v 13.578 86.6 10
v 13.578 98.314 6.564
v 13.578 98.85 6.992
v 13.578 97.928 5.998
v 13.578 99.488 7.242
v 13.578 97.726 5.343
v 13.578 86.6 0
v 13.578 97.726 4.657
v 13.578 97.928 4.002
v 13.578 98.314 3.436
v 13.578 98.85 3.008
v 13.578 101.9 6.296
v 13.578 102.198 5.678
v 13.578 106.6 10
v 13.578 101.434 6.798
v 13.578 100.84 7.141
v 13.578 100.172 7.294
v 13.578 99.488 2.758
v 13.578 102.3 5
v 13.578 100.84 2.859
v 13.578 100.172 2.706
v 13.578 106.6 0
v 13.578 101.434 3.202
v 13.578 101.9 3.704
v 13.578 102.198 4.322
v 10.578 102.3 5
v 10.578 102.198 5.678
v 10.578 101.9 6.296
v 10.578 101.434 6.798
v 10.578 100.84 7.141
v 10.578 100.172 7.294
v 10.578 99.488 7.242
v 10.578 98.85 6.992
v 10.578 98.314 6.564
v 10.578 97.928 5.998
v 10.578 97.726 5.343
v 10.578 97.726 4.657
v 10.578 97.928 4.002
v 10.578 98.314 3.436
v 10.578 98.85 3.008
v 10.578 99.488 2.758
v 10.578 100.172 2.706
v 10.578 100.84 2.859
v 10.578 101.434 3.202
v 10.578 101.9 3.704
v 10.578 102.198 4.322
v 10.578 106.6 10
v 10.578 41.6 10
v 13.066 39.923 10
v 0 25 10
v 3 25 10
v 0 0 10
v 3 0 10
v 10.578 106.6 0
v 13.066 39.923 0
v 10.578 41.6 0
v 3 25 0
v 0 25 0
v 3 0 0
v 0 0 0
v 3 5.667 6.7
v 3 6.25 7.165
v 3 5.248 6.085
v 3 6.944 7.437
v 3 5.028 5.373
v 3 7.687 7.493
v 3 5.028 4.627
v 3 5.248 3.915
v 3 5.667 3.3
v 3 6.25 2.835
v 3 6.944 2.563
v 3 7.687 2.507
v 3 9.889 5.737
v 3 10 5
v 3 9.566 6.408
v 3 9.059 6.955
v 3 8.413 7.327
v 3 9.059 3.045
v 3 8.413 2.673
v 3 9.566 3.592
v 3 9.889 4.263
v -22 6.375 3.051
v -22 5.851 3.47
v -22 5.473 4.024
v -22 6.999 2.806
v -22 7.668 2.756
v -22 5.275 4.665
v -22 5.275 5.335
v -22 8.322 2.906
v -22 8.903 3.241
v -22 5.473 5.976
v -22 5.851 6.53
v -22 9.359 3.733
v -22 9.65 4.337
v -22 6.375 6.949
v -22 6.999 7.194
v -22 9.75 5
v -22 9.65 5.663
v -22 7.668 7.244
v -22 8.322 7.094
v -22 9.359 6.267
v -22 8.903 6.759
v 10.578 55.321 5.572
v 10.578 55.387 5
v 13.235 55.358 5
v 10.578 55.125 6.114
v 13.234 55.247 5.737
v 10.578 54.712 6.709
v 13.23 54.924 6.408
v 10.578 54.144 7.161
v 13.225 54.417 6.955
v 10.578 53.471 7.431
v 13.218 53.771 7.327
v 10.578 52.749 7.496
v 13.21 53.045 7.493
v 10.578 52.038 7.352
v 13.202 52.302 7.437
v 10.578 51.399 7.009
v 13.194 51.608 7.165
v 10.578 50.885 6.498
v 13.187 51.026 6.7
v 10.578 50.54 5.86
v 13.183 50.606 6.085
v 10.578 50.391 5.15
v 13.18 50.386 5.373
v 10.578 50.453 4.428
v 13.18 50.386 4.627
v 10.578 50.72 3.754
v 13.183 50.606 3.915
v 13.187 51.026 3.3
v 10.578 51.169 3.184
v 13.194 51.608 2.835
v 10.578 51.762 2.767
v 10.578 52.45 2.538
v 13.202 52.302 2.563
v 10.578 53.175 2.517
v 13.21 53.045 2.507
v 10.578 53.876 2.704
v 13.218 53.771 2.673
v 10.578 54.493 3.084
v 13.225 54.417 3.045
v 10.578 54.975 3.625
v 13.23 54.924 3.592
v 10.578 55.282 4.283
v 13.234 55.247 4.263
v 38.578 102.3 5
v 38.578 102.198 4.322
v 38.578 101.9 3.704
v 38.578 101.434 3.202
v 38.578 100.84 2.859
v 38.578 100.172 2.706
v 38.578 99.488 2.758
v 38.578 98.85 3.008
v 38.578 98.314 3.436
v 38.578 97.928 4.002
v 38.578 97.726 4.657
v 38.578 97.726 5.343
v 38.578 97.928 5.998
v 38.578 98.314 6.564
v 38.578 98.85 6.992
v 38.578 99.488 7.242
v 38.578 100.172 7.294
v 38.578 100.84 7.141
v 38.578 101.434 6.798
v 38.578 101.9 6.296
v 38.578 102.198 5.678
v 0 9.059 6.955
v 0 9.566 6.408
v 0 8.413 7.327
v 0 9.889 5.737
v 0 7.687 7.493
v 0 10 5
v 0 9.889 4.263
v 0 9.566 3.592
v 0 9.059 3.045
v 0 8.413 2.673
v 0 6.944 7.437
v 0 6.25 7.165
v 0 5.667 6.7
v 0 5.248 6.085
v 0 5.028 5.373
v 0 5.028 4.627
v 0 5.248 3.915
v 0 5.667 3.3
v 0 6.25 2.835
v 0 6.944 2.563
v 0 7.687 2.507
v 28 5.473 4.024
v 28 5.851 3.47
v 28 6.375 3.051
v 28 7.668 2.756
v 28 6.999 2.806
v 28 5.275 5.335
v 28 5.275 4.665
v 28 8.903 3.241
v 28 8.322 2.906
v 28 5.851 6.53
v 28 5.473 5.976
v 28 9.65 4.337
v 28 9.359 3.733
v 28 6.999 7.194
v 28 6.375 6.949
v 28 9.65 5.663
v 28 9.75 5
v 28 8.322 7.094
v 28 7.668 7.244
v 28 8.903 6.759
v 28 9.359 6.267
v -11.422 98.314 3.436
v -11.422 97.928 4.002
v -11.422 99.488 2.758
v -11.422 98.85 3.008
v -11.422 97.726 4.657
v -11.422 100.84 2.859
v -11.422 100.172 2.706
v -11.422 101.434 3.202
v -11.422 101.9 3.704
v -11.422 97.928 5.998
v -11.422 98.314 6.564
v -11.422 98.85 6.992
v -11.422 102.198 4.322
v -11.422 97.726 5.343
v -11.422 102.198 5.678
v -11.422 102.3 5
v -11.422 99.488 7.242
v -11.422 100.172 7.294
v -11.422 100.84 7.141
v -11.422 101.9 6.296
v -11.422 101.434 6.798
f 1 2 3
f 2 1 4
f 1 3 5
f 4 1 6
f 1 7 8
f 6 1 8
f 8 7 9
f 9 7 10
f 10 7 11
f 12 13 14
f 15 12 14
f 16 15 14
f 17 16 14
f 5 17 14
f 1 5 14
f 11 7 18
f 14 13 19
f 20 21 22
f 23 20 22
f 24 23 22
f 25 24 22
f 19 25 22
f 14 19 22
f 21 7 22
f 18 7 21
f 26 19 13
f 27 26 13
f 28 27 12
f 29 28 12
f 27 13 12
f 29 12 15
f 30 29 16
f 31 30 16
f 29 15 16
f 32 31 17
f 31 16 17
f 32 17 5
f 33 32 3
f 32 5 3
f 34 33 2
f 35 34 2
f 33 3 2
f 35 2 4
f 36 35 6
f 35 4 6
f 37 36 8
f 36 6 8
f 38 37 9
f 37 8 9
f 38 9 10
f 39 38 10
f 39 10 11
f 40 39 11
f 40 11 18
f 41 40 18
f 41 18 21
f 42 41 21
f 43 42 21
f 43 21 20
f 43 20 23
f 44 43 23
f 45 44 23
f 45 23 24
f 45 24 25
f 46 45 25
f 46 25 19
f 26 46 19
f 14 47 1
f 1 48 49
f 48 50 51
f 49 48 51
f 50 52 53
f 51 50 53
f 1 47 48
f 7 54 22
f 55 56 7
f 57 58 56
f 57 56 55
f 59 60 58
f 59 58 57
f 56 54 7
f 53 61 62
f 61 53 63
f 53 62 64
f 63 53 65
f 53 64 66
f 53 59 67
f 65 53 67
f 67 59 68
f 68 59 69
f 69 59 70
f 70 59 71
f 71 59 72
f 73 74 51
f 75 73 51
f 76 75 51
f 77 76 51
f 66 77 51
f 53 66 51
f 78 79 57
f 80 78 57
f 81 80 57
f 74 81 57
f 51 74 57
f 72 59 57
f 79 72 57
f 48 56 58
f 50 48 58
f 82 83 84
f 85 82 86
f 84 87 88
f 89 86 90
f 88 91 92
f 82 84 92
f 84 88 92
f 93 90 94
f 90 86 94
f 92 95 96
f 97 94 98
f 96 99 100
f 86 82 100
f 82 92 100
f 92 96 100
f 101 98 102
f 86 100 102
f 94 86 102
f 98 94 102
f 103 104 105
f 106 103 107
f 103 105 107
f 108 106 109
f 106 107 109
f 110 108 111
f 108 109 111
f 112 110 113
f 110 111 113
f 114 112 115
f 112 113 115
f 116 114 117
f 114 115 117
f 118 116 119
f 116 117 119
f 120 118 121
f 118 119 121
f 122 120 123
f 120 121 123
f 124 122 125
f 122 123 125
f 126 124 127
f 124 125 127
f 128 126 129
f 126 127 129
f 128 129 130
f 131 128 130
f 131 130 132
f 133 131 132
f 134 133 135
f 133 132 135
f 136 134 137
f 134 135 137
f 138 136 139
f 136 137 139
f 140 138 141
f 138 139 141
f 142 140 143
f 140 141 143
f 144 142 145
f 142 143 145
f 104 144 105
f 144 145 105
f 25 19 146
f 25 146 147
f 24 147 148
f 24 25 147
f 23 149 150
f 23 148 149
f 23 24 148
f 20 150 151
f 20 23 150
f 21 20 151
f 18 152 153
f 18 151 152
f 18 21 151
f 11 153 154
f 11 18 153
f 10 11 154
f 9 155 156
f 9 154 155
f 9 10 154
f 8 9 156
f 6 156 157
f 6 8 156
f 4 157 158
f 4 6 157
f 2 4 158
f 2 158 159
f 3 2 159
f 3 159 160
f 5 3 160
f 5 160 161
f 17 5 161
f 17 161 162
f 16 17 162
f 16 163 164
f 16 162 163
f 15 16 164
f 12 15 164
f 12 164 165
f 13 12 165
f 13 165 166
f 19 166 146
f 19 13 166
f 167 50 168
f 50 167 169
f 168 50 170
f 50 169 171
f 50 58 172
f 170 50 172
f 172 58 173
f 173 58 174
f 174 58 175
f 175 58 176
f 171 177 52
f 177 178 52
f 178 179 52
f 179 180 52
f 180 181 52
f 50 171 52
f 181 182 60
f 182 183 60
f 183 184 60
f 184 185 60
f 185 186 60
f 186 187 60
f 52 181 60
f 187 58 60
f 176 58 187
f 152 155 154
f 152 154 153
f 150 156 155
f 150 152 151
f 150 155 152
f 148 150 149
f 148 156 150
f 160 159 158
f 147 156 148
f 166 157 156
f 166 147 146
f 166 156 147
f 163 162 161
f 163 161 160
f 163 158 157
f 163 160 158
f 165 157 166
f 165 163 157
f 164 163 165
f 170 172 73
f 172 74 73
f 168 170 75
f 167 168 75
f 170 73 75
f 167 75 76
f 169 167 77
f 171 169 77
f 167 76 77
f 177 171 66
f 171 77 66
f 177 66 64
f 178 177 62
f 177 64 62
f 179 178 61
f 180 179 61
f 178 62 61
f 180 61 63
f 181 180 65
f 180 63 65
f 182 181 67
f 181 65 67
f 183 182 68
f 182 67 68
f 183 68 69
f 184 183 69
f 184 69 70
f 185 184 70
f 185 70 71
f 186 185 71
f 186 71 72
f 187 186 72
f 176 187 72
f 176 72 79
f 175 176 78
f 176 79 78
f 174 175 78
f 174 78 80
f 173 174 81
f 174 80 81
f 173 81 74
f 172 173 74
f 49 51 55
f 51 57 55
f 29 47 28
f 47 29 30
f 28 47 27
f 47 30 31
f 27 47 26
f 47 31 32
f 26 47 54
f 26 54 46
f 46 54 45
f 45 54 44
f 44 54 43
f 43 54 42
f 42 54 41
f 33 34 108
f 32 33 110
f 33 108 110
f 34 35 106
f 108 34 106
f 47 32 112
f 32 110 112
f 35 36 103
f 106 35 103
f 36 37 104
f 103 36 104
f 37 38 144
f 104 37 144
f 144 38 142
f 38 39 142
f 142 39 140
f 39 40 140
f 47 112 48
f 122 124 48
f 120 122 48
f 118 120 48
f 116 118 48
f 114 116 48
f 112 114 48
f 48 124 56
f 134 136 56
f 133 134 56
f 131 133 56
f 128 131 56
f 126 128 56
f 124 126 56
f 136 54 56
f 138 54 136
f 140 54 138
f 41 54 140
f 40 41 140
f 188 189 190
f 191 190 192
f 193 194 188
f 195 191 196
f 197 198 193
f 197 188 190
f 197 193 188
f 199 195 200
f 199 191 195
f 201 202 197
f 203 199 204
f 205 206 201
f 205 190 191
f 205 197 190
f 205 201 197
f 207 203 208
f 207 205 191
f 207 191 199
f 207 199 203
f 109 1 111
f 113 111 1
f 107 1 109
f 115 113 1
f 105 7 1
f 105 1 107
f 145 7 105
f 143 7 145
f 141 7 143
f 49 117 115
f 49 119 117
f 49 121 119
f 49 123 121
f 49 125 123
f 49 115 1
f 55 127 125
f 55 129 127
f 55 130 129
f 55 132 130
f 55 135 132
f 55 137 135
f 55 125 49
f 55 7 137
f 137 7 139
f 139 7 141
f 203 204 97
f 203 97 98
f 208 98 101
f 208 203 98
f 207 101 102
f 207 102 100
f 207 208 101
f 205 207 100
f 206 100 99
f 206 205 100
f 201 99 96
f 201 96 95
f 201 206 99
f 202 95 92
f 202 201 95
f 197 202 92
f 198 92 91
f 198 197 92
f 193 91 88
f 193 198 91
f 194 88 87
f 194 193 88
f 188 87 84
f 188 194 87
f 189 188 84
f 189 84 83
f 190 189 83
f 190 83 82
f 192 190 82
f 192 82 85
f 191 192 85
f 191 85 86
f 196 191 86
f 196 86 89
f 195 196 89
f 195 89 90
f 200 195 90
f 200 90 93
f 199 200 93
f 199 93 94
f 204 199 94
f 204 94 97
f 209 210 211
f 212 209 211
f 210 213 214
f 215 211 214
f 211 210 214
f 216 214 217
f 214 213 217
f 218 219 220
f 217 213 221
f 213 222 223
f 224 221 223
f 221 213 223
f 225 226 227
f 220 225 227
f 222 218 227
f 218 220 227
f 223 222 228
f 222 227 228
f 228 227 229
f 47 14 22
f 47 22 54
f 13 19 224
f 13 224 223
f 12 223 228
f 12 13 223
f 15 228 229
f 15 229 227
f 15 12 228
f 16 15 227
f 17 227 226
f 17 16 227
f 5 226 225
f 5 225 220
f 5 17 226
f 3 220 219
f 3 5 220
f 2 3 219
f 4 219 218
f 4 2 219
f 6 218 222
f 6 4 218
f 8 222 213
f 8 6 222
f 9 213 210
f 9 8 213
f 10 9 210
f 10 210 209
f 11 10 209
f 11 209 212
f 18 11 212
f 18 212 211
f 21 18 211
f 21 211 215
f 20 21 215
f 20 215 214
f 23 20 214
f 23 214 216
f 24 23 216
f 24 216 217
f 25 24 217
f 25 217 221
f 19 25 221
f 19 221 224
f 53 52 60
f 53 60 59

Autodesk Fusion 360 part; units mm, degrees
sketch "Sketch1" plane through (0, 0, 0) normal (0, 0, 1) x (1, 0, 0)
  line L0 (0, 0) -> (3, 0)
  line L1 (3, 0) -> (3, 25)
  line L2 (3, 25) -> (-15, 25) construction
  line L3 (-6.9872, 39.9752) -> (-9.4831, 38.3106)
  line L4 (3, 25) -> (13.0655, 39.9227)
  line L5 (3, 25) -> (21, 25) construction
  line L6 (13.0655, 39.9227) -> (10.5784, 41.6003)
  line L7 (10.5784, 41.6003) -> (0, 25)
  line L8 (10.5784, 41.6003) -> (10.5784, 86.6003)
  line L9 (10.5784, 86.6003) -> (13.5784, 86.6003)
  line L10 (13.5784, 86.6003) -> (13.0655, 39.9227)
  line L11 (0, 25) -> (0, 0)
  dimension "d1" = 3
  dimension "d2" = 25
  dimension "d6" = 56
  dimension "d7" = 18
  dimension "d8" = 3
  dimension "d9" = 45
  dimension "d10" = 3
extrude "Extrude1" add sketch "Sketch1" along normal blind 10 makes body 1
sketch "Sketch2" plane through (3, 0, 0) normal (1, 0, 0) x (0, 1, 0)
  line L0 (0, 0) -> (25, 0)
  line L1 (25, 0) -> (25, 10)
  line L2 (25, 10) -> (0, 10)
  line L3 (0, 10) -> (0, 0)
  line L4 (0, 5) -> (7.5, 5)
  circle A0 centre (7.5, 5) radius 2.5
  dimension "d13" = 7.5
  dimension "d14" = 5
extrude "Extrude2" cut sketch "Sketch2" against normal blind 17 contours A0 bodies 1
sketch "Sketch3" plane through (12.6253, -0.1387, 0) normal (0.9999, -0.011, 0) x (0.011, 0.9999, 0)
  line L0 (40.0638, 0) -> (86.7442, 0)
  line L1 (86.7442, 0) -> (86.7442, 10)
  line L2 (86.7442, 10) -> (40.0638, 10)
  line L3 (40.0638, 10) -> (40.0638, 0)
sketch "Sketch4" plane through (0, 0, 0) normal (1, 0, 0) x (0, 1, 0)
sketch "Sketch5" plane through (12.6253, -0.1387, 0) normal (0.9999, -0.011, 0) x (0.011, 0.9999, 0)
  circle A0 centre (53, 5) radius 2.5
  dimension "d19" = 5
extrude "Extrude3" cut sketch "Sketch5" against normal blind 10 bodies 1
sketch "Sketch6" plane through (0, 0, 0) normal (0, 0, -1) x (1, 0, 0)
  line L0 (0, -25) -> (10.5784, -41.6003)
  line L1 (10.5784, -41.6003) -> (10.5784, -86.6003)
  line L2 (10.5784, -86.6003) -> (13.5784, -86.6003)
  line L3 (13.5784, -86.6003) -> (13.0655, -39.9227)
  line L4 (13.0655, -39.9227) -> (3, -25)
  line L5 (3, -25) -> (3, 0)
  line L6 (3, 0) -> (0, 0)
  line L7 (0, 0) -> (0, -25)
  line L8 (13.5784, -86.6003) -> (13.5784, -106.6003)
  line L9 (13.5784, -106.6003) -> (10.5784, -106.6003)
  line L10 (10.5784, -106.6003) -> (10.5784, -86.6003)
  dimension "d22" = 20
  dimension "d23" = 3
extrude "Extrude4" add sketch "Sketch6" against normal blind 10 contours L2 L8 L9 L10 bodies 1
sketch "Sketch7" plane through (13.5784, 0, 0) normal (1, 0, 0) x (0, 1, 0)
  line L0 (86.6003, 0) -> (106.6003, 0)
  line L1 (106.6003, 0) -> (106.6003, 10)
  line L2 (106.6003, 10) -> (86.6003, 10)
  line L3 (86.6003, 10) -> (86.6003, 0)
  circle A0 centre (100, 5) radius 2.5
  dimension "d26" = 5
extrude "Extrude5" cut sketch "Sketch7" against normal blind 10 contours A0 bodies 1
sketch "Sketch8" plane through (13.5784, 0, 0) normal (1, 0, 0) x (0, 1, 0)
  circle A0 centre (100, 5) radius 2.5
  line L0 (86.6003, 0) -> (106.6003, 0)
  line L1 (106.6003, 0) -> (106.6003, 10)
  line L2 (106.6003, 10) -> (86.6003, 10)
  line L3 (86.6003, 10) -> (86.6003, 0)
  circle A1 centre (100, 5) radius 2.3
  dimension "d31" = 4.6
extrude "Extrude6" add sketch "Sketch8" against normal blind 30 contours A0 bodies 1
extrude "Extrude7" add sketch "Sketch8" along normal blind 25 and the other way blind 25 separate body contours A1 makes body 2
sketch "Sketch9" plane through (3, 0, 0) normal (1, 0, 0) x (0, 1, 0)
  circle A0 centre (7.5, 5) radius 2.5
  line L0 (0, 0) -> (25, 0)
  line L1 (25, 0) -> (25, 10)
  line L2 (25, 10) -> (0, 10)
  line L3 (0, 10) -> (0, 0)
  circle A1 centre (7.5, 5) radius 2.25
  dimension "d36" = 4.5
extrude "Extrude8" add sketch "Sketch9" along normal blind -25 and the other way blind -25 separate body contours A1 makes body 3
delete_face "DeleteFace1" 1 faces at (-7.4216, 102.4876, 4.7511) on bodies 1
